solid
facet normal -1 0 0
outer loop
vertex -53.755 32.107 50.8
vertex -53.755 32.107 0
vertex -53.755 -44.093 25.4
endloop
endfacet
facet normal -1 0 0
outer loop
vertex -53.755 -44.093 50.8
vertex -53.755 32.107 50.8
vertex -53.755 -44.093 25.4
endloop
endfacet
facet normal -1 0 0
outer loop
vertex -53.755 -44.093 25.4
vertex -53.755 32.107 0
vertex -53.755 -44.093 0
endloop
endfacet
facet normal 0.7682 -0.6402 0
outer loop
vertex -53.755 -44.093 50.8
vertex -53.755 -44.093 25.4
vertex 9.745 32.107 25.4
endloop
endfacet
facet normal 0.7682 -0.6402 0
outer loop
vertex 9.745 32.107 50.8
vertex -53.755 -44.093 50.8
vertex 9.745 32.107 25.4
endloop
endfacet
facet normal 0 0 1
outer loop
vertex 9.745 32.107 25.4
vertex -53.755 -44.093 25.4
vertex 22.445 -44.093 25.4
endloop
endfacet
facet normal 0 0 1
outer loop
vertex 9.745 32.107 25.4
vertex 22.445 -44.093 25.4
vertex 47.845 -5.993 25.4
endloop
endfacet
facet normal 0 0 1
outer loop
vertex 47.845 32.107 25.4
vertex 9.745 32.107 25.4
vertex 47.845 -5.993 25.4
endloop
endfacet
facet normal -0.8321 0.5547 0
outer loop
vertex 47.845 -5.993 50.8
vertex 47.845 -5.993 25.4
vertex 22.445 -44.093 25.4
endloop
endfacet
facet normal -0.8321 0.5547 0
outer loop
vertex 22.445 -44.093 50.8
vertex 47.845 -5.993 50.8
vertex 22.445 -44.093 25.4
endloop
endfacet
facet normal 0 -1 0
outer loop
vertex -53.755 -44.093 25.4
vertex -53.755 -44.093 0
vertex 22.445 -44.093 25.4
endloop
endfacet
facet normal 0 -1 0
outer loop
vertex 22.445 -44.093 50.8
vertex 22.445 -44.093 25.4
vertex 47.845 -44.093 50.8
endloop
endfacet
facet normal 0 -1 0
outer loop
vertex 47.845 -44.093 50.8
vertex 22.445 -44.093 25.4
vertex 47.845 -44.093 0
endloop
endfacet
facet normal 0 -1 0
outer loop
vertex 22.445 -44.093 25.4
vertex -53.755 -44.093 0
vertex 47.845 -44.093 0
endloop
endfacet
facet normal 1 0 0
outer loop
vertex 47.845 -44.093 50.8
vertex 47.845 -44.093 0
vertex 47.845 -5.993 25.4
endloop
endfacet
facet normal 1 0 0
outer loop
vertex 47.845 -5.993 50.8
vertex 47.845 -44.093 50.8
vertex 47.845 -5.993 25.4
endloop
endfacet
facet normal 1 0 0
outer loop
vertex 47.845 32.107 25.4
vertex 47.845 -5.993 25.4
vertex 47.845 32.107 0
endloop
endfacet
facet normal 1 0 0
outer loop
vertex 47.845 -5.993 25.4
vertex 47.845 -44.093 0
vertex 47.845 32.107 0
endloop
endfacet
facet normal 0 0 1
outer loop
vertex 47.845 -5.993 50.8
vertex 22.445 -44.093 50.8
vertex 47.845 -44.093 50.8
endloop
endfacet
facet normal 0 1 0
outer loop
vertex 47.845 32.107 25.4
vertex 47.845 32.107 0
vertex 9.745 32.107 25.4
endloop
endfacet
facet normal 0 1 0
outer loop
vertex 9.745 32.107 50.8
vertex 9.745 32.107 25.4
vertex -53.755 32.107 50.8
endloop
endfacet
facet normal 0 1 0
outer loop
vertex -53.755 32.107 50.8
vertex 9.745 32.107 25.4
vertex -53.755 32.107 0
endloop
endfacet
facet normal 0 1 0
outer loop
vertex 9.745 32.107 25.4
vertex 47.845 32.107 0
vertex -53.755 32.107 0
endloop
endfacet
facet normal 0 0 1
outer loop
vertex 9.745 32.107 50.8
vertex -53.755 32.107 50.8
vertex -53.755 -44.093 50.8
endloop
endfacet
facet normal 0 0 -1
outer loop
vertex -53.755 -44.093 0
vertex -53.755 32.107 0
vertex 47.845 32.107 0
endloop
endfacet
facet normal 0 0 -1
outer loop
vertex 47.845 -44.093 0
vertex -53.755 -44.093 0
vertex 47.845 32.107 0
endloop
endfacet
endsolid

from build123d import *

# Parameters (mm, degrees)
F0_W     = 101.6
F0_H     = 76.2
F1_DEPTH = 25.4
F3_DEPTH = 25.4
F5_DEPTH = 25.4


with BuildPart() as f1:
    # F0 (on Top) → F1 (new body)
    with BuildSketch(Plane.XY):
        with Locations((-2.955392, -5.993164)):
            Rectangle(F0_W, F0_H)
    extrude(amount=F1_DEPTH)

    # F2 (on face) → F3 (join)
    with BuildSketch(Plane.XY.offset(25.4)):
        Polygon((47.844608, -5.993164), (22.444608, -44.093164), (47.844608, -44.093164), align=None)
    extrude(amount=F3_DEPTH)

    # F4 (on face) → F5 (join)
    with BuildSketch(Plane.XY.offset(25.4)):
        Polygon((-53.755392, 32.106836), (-53.755392, -44.093164), (9.744608, 32.106836), align=None)
    extrude(amount=F5_DEPTH)


solid = f1.part
